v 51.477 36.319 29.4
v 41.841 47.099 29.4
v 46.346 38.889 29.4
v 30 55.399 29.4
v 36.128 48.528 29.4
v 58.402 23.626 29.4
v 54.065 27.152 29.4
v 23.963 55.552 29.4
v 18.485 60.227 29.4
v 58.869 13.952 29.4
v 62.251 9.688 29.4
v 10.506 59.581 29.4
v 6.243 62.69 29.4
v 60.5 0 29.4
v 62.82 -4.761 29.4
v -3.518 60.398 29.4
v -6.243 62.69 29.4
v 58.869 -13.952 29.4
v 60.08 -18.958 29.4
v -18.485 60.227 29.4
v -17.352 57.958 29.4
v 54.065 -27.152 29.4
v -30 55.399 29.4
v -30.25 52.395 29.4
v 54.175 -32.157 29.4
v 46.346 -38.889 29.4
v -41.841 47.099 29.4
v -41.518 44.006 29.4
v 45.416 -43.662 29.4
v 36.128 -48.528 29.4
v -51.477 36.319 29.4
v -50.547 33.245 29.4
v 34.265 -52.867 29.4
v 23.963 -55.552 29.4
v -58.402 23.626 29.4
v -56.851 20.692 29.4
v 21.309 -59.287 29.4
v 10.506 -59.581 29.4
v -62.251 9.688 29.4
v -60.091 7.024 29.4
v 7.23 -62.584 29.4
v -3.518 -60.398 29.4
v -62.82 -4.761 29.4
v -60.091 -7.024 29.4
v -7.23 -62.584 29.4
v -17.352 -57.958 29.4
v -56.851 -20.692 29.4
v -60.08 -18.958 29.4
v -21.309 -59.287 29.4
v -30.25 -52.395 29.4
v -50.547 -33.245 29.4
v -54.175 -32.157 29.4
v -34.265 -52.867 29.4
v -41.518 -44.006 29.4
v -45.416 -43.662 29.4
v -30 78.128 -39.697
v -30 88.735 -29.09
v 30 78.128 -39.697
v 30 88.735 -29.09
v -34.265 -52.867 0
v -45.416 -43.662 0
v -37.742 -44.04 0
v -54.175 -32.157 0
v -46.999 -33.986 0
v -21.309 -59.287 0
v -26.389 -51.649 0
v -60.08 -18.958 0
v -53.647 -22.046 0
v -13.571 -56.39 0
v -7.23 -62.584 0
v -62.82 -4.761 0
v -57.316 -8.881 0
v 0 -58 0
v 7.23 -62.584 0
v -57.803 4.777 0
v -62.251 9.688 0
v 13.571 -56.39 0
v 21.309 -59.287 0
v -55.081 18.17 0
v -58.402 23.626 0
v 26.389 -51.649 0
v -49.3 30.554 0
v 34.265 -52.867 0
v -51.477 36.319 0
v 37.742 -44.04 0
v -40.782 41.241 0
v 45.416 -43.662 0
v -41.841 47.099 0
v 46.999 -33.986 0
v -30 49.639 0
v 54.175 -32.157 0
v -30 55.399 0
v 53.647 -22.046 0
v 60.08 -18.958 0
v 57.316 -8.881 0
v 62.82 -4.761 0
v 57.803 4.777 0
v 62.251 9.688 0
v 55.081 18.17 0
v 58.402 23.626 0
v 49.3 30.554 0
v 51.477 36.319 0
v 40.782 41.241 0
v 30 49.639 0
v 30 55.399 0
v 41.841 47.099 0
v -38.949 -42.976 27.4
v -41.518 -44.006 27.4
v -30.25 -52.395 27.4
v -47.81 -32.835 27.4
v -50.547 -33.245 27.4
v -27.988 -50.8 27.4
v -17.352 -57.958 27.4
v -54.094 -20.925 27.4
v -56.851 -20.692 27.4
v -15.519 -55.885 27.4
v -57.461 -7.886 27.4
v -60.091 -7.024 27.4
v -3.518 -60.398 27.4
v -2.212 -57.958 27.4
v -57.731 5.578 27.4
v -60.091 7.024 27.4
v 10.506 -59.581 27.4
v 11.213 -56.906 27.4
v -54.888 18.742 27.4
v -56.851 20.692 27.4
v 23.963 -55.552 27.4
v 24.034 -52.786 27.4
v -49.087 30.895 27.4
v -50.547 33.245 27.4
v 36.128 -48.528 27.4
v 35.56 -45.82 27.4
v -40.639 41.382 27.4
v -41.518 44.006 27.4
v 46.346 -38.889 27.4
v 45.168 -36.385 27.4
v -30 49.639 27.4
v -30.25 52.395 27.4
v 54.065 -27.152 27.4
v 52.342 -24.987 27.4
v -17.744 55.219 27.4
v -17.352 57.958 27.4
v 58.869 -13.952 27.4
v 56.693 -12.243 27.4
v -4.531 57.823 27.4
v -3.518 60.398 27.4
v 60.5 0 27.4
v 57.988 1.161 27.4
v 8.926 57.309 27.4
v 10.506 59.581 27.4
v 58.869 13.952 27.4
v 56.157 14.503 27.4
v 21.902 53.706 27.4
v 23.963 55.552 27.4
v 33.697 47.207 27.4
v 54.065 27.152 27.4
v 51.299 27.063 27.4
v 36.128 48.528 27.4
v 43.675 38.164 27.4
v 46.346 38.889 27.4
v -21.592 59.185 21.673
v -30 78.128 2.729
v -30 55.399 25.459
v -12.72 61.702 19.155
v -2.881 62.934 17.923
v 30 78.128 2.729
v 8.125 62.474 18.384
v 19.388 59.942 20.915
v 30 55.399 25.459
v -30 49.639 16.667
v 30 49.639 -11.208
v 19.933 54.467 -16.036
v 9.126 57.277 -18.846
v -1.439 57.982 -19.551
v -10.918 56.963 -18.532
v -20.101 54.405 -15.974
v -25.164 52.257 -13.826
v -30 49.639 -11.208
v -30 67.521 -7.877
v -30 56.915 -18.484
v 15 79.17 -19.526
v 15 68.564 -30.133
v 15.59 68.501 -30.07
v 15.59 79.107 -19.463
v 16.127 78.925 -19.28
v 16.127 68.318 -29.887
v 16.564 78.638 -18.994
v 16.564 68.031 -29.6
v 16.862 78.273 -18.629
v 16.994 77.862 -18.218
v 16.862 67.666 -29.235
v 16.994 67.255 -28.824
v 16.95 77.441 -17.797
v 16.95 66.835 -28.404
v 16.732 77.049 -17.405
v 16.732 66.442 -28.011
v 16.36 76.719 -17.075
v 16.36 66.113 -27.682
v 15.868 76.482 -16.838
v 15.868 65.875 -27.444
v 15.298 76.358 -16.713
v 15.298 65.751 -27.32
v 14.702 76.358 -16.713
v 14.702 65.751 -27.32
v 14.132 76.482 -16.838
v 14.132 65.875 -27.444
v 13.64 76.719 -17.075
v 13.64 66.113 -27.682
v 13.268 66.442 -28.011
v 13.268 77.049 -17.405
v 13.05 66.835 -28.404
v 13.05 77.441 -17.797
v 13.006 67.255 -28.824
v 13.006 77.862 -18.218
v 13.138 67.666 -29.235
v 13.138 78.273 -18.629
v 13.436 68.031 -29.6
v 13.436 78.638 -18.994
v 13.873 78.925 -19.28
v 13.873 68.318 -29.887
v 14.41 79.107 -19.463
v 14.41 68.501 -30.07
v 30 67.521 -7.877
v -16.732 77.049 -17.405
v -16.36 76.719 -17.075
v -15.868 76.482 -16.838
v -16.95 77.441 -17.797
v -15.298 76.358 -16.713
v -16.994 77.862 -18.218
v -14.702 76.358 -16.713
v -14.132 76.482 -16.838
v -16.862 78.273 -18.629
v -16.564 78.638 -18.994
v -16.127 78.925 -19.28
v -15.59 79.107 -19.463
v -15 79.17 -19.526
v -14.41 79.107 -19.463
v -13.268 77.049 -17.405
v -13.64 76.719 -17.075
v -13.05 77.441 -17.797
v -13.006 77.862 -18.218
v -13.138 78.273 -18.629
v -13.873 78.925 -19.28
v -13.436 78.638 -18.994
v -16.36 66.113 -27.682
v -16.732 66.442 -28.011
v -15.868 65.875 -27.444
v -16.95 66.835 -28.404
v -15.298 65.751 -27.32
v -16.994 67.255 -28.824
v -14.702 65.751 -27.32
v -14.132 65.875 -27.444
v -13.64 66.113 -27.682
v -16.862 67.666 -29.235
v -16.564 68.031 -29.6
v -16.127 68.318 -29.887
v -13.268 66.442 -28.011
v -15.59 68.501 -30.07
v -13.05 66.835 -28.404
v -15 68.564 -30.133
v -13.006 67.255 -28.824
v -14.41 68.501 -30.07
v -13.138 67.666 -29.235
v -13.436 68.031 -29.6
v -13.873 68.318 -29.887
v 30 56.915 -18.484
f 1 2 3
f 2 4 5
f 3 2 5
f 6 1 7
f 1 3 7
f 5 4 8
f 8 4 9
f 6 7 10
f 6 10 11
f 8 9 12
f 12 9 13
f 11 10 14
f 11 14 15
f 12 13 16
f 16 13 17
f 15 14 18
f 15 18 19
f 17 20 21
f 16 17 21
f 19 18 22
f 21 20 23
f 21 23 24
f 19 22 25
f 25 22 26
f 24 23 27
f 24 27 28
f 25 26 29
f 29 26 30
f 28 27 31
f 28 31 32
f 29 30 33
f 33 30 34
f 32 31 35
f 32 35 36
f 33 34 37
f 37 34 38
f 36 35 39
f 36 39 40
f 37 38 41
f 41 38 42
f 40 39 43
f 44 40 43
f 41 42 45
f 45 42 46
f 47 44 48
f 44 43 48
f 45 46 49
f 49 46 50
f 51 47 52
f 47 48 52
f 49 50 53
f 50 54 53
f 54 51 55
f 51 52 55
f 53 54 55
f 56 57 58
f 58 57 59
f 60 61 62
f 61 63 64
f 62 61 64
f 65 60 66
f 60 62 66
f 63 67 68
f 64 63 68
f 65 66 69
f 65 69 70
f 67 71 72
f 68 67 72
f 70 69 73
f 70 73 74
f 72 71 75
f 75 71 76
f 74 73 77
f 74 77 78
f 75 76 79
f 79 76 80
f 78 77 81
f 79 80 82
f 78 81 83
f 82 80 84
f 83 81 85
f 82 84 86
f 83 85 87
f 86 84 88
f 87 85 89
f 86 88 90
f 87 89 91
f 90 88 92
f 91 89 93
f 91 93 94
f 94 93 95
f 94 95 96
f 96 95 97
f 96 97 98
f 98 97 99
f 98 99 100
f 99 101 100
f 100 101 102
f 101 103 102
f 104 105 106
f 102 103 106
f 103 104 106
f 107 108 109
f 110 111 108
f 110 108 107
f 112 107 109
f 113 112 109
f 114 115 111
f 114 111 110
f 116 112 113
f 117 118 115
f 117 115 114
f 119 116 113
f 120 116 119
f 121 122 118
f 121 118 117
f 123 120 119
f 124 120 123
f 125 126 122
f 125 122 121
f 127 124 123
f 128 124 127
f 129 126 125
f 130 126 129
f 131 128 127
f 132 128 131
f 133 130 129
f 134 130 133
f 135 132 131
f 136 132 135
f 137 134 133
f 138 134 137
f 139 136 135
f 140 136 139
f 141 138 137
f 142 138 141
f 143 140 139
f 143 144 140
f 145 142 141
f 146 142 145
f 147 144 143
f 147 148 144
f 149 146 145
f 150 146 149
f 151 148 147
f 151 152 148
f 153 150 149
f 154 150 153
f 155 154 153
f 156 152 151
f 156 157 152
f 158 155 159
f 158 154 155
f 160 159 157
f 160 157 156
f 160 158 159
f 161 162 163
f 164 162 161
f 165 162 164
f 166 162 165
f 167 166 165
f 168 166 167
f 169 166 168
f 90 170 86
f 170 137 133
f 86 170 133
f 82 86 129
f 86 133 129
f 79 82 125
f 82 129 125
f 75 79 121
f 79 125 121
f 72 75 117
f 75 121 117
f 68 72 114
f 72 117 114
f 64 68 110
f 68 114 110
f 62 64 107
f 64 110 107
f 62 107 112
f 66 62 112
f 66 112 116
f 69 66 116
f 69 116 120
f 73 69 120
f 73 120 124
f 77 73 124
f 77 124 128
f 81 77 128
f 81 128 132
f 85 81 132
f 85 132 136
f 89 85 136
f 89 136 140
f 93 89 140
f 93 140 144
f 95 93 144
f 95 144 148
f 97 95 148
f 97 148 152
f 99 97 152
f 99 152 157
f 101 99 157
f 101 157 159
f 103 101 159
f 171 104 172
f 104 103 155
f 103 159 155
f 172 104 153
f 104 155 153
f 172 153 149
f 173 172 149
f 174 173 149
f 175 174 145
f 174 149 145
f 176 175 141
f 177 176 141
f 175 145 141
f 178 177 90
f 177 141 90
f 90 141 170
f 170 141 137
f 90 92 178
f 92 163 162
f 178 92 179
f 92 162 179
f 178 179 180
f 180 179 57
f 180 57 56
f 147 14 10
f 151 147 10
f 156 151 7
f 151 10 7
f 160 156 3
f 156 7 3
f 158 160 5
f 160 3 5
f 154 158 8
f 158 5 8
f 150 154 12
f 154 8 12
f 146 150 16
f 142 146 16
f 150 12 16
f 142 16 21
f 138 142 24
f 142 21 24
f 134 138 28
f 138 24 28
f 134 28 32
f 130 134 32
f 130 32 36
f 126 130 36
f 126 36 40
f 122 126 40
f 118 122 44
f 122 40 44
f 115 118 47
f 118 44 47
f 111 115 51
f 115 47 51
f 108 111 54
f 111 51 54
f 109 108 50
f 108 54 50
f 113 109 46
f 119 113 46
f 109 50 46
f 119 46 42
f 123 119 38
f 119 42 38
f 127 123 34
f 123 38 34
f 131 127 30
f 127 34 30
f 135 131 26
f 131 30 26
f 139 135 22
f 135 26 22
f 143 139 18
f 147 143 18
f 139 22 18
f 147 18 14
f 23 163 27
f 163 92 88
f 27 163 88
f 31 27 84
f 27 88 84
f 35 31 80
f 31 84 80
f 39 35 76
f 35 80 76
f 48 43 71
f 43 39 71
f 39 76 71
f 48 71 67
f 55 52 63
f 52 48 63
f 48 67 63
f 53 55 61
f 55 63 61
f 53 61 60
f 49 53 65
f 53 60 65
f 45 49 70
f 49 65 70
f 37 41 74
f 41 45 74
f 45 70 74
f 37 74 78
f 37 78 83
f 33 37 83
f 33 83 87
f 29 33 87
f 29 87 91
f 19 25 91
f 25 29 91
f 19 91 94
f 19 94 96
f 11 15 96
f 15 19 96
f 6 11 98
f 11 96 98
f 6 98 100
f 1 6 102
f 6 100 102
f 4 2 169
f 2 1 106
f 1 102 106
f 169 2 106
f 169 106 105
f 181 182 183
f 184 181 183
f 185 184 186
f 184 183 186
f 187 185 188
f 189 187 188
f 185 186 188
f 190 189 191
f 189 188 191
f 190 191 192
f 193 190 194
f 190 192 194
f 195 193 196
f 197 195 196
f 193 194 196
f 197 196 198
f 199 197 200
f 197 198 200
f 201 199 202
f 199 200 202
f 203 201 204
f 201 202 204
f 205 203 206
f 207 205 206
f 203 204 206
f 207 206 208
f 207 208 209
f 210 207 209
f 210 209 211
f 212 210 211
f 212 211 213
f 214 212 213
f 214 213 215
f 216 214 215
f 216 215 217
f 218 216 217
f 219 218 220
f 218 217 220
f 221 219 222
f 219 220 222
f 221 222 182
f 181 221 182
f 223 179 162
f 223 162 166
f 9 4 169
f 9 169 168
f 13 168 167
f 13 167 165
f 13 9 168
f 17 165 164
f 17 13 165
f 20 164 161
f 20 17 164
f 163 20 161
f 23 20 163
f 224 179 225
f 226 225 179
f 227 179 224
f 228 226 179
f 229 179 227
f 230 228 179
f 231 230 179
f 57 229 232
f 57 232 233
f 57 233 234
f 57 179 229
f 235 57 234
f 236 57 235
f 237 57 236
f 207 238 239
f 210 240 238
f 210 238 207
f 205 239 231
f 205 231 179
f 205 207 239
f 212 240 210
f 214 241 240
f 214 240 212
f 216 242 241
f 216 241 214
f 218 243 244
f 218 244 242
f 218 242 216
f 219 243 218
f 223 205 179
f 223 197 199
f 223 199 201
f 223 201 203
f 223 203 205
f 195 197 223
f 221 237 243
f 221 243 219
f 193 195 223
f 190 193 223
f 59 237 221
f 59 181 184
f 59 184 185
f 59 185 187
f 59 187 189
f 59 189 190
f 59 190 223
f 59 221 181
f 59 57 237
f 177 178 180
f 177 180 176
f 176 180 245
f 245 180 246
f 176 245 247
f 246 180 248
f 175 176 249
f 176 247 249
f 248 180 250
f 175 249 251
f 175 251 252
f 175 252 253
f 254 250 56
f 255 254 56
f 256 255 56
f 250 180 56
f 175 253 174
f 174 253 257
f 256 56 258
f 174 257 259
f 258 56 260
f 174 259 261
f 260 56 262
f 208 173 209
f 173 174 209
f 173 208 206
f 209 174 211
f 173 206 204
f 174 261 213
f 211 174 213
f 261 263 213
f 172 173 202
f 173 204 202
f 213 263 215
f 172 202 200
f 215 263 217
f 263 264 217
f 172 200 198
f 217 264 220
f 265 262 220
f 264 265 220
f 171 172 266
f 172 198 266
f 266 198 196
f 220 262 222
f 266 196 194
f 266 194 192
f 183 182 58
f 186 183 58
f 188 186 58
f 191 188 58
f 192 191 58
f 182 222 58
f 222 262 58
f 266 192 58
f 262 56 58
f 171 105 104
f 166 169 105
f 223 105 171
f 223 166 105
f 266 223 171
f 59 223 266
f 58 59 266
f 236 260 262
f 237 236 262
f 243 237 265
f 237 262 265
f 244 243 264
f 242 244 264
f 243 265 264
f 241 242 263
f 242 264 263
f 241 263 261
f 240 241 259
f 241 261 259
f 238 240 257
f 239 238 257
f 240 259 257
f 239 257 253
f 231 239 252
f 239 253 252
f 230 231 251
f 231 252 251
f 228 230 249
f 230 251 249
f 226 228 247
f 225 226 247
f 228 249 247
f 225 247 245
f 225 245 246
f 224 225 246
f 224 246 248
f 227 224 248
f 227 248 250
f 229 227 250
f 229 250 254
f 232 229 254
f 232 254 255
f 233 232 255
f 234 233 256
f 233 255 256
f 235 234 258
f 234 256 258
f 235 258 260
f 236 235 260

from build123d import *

# Parameters (mm, degrees)
SKETCH1_R                  = 63
SKETCH1_R_2                = 58
BOSS_EXTRUDE1_DEPTH        = 29.4
SKETCH2_R                  = 60.5
SKETCH2_R_2                = 58
CUT_EXTRUDE1_DEPTH         = 2
BOSS_EXTRUDE2_REACH        = 115.821
BOSS_EXTRUDE2_START_RADIUS = 63
BOSS_EXTRUDE2_END_RADIUS   = 63
SKETCH3_W                  = 60
SKETCH3_H                  = 29.4
SKETCH5_W                  = 29.4
SKETCH5_H                  = 24.463774017
CUT_EXTRUDE2_DEPTH         = 60
BOSS_EXTRUDE3_DEPTH        = 60
SKETCH7_W                  = 60
SKETCH7_H                  = 41.577878734
BOSS_EXTRUDE4_DEPTH        = 50
CUT_EXTRUDE3_REACH         = 173.878
SKETCH9_W                  = 60
SKETCH9_H                  = 50
BOSS_EXTRUDE5_DEPTH        = 26.14
SKETCH10_W                 = 60
SKETCH10_H                 = 26.14
BOSS_EXTRUDE6_DEPTH        = 30
SKETCH11_R                 = 58
CUT_EXTRUDE4_DEPTH         = 168.932327916
SKETCH14_W                 = 60
SKETCH14_H                 = 55.370879129
CUT_EXTRUDE5_DEPTH         = 14.7
CUT_EXTRUDE6_REACH         = 171.856
BOSS_EXTRUDE7_DEPTH        = 60
SKETCH17_R                 = 58
CUT_EXTRUDE7_DEPTH         = 155.195379415
SKETCH18_W                 = 60
SKETCH18_H                 = 15
CUT_EXTRUDE8_DEPTH         = 50
SKETCH19_R                 = 2
CUT_EXTRUDE9_DEPTH         = 15
SKETCH20_W                 = 60
SKETCH20_H                 = 20
CUT_EXTRUDE10_DEPTH        = 140.943357594


with BuildPart() as part:
    # Sketch1 → Boss-Extrude1 (new body)
    with BuildSketch(Plane.XY):
        Circle(SKETCH1_R)
        Circle(SKETCH1_R_2, mode=Mode.SUBTRACT)
    extrude(amount=BOSS_EXTRUDE1_DEPTH)

    # Sketch2 → Cut-Extrude1 (cut)
    with BuildSketch(Plane.XY.offset(29.4)):
        Circle(SKETCH2_R)
        Circle(SKETCH2_R_2, mode=Mode.SUBTRACT)
    extrude(amount=-CUT_EXTRUDE1_DEPTH, mode=Mode.SUBTRACT)

    # Boss-Extrude2: from a cylinder face, 115.821 long prism both ways, kept between that surface and its translate by the depth
    boss_extrude2_start = Plane(origin=(0, 0, 14.7), z_dir=(0, 0, -1)) * Cylinder(BOSS_EXTRUDE2_START_RADIUS, 358.642, mode=Mode.PRIVATE)
    boss_extrude2_end = Plane(origin=(0, 20, 14.7), z_dir=(0, 0, -1)) * Cylinder(BOSS_EXTRUDE2_END_RADIUS, 358.642, mode=Mode.PRIVATE)
    # Sketch3 → Boss-Extrude2 (add, from a surface)
    with BuildSketch(Plane(origin=(0, 0, 0), x_dir=(1, 0, 0), z_dir=(0, 1, 0)), mode=Mode.PRIVATE) as boss_extrude2_sk1:
        with Locations((0, -14.7)):
            Rectangle(SKETCH3_W, SKETCH3_H)
    boss_extrude2_tool1 = extrude(boss_extrude2_sk1.sketch, amount=BOSS_EXTRUDE2_REACH, both=True, mode=Mode.PRIVATE)
    add(((boss_extrude2_tool1 - boss_extrude2_start) & boss_extrude2_end).solids().sort_by_distance((0, 65.398556, 14.7))[0])

    # Sketch5 → Cut-Extrude2 (cut)
    with BuildSketch(Plane.ZY.offset(30)):
        with Locations((14.7, 87.630442947)):
            Rectangle(SKETCH5_W, SKETCH5_H)
    extrude(amount=-CUT_EXTRUDE2_DEPTH, mode=Mode.SUBTRACT)

    # Sketch6 → Boss-Extrude3 (add)
    with BuildSketch(Plane.ZY.offset(30)):
        Polygon((0, 75.398555938), (29.4, 104.798555938), (29.4, 75.398555938), align=None)
    extrude(amount=-BOSS_EXTRUDE3_DEPTH)

    # Sketch7 → Boss-Extrude4 (add)
    with BuildSketch(Plane(origin=(0, 37.699277969, -37.699277969), x_dir=(1, 0, 0), z_dir=(0, 0.7071067811865513, -0.7071067811865438))):
        with Locations((0, -74.103769562)):
            Rectangle(SKETCH7_W, SKETCH7_H)
    extrude(amount=BOSS_EXTRUDE4_DEPTH)

    # Sketch8 → Cut-Extrude3 (cut, up to next)
    with BuildSketch(Plane(origin=(30, 0, 0), x_dir=(0, 0, -1), z_dir=(1, 0, 0)), mode=Mode.PRIVATE) as cut_extrude3_sk1:
        Polygon((14.566399692, 131.542834364), (-29.4, 87.576434672), (-29.4, 104.798555938), (5.955339059, 140.153894997), align=None)
    cut_extrude3_tool1 = extrude(cut_extrude3_sk1.sketch, amount=-CUT_EXTRUDE3_REACH, mode=Mode.PRIVATE) & part.part
    add(cut_extrude3_tool1.solids().sort_by_distance((30, 115.784229, 9.491665))[0], mode=Mode.SUBTRACT)

    # Sketch9 → Boss-Extrude5 (add)
    with BuildSketch(Plane(origin=(0, 37.699277969, 37.699277969), x_dir=(1, 0, 0), z_dir=(0, -0.7071067811865438, -0.7071067811865512))):
        with Locations((0, -78.314830195)):
            Rectangle(SKETCH9_W, SKETCH9_H)
    extrude(amount=BOSS_EXTRUDE5_DEPTH)

    # Sketch10 → Boss-Extrude6 (add)
    with BuildSketch(Plane(origin=(0, 37.699277969, -37.699277969), x_dir=(1, 0, 0), z_dir=(0, -0.7071067811865511, 0.707106781186544))):
        with Locations((0, 40.244830195)):
            Rectangle(SKETCH10_W, SKETCH10_H)
    extrude(amount=BOSS_EXTRUDE6_DEPTH)

    # Sketch11 → Cut-Extrude4 (cut, through all)
    with BuildSketch(Plane.XY.offset(29.4)):
        with Locations(Location((0, 0, 0), (0, 0, 121.147389922))):
            Circle(SKETCH11_R)
    extrude(amount=-CUT_EXTRUDE4_DEPTH, mode=Mode.SUBTRACT)

    # Sketch14 → Cut-Extrude5 (cut)
    with BuildSketch(Plane.XY.offset(29.4)):
        with Locations((0, 115.261874237)):
            Rectangle(SKETCH14_W, SKETCH14_H)
        with BuildLine():
            ThreePointArc((30, 55.398555938), (0, 63), (-30, 55.398555938))
            Line((-30, 55.398555938), (-30, 87.576434672))
            Line((-30, 87.576434672), (30, 87.576434672))
            Line((30, 87.576434672), (30, 55.398555938))
        make_face()
    extrude(amount=-CUT_EXTRUDE5_DEPTH, mode=Mode.SUBTRACT)

    # Sketch15 → Cut-Extrude6 (cut, up to next)
    with BuildSketch(Plane(origin=(30, 0, 0), x_dir=(0, 0, -1), z_dir=(1, 0, 0)), mode=Mode.PRIVATE) as cut_extrude6_sk1:
        Polygon((32.625906884, 113.483327173), (-14.7, 66.157420289), (-14.7, 102.276434672), (14.566399692, 131.542834364), align=None)
    cut_extrude6_tool1 = extrude(cut_extrude6_sk1.sketch, amount=-CUT_EXTRUDE6_REACH, mode=Mode.PRIVATE) & part.part
    add(cut_extrude6_tool1.solids().sort_by_distance((30, 102.300453, -4.802927))[0], mode=Mode.SUBTRACT)

    # Sketch16 → Boss-Extrude7 (add)
    with BuildSketch(Plane(origin=(30, 0, 0), x_dir=(0, 0, -1), z_dir=(1, 0, 0))):
        Polygon((-14.7, 66.157420289), (-25.458864351, 55.398555938), (-14.7, 55.398555938), align=None)
    extrude(amount=-BOSS_EXTRUDE7_DEPTH)

    # Sketch17 → Cut-Extrude7 (cut, through all)
    with BuildSketch(Plane.XY.offset(29.4)):
        with Locations(Location((0, 0, 0), (0, 0, 121.147389922))):
            Circle(SKETCH17_R)
    extrude(amount=-CUT_EXTRUDE7_DEPTH, mode=Mode.SUBTRACT)

    # Sketch18 → Cut-Extrude8 (cut)
    with BuildSketch(Plane(origin=(0, 73.054617028, -73.054617028), x_dir=(1, 0, 0), z_dir=(0, 0.7071067811865512, -0.7071067811865438))):
        with Locations((0, -49.674830195)):
            Rectangle(SKETCH18_W, SKETCH18_H)
    extrude(amount=-CUT_EXTRUDE8_DEPTH, mode=Mode.SUBTRACT)

    # Sketch19 → Cut-Extrude9 (cut)
    with BuildSketch(Plane(origin=(0, 19.215506709, 19.215506709), x_dir=(1, 0, 0), z_dir=(0, -0.7071067811865438, -0.7071067811865512))):
        with Locations(Location((15, -67.788834976, 0), (0, 0, 270))):
            Circle(SKETCH19_R)
        with Locations(Location((-15, -67.788834976, 0), (0, 0, 270))):
            Circle(SKETCH19_R)
    extrude(amount=-CUT_EXTRUDE9_DEPTH, mode=Mode.SUBTRACT)

    # Sketch20 → Cut-Extrude10 (cut, through all)
    with BuildSketch(Plane(origin=(0, 29.822108427, 29.822108427), x_dir=(1, 0, 0), z_dir=(0, 0.7071067811865438, 0.7071067811865513))):
        with Locations((0, 93.314830195)):
            Rectangle(SKETCH20_W, SKETCH20_H)
    extrude(amount=-CUT_EXTRUDE10_DEPTH, mode=Mode.SUBTRACT)


solid = part.part
